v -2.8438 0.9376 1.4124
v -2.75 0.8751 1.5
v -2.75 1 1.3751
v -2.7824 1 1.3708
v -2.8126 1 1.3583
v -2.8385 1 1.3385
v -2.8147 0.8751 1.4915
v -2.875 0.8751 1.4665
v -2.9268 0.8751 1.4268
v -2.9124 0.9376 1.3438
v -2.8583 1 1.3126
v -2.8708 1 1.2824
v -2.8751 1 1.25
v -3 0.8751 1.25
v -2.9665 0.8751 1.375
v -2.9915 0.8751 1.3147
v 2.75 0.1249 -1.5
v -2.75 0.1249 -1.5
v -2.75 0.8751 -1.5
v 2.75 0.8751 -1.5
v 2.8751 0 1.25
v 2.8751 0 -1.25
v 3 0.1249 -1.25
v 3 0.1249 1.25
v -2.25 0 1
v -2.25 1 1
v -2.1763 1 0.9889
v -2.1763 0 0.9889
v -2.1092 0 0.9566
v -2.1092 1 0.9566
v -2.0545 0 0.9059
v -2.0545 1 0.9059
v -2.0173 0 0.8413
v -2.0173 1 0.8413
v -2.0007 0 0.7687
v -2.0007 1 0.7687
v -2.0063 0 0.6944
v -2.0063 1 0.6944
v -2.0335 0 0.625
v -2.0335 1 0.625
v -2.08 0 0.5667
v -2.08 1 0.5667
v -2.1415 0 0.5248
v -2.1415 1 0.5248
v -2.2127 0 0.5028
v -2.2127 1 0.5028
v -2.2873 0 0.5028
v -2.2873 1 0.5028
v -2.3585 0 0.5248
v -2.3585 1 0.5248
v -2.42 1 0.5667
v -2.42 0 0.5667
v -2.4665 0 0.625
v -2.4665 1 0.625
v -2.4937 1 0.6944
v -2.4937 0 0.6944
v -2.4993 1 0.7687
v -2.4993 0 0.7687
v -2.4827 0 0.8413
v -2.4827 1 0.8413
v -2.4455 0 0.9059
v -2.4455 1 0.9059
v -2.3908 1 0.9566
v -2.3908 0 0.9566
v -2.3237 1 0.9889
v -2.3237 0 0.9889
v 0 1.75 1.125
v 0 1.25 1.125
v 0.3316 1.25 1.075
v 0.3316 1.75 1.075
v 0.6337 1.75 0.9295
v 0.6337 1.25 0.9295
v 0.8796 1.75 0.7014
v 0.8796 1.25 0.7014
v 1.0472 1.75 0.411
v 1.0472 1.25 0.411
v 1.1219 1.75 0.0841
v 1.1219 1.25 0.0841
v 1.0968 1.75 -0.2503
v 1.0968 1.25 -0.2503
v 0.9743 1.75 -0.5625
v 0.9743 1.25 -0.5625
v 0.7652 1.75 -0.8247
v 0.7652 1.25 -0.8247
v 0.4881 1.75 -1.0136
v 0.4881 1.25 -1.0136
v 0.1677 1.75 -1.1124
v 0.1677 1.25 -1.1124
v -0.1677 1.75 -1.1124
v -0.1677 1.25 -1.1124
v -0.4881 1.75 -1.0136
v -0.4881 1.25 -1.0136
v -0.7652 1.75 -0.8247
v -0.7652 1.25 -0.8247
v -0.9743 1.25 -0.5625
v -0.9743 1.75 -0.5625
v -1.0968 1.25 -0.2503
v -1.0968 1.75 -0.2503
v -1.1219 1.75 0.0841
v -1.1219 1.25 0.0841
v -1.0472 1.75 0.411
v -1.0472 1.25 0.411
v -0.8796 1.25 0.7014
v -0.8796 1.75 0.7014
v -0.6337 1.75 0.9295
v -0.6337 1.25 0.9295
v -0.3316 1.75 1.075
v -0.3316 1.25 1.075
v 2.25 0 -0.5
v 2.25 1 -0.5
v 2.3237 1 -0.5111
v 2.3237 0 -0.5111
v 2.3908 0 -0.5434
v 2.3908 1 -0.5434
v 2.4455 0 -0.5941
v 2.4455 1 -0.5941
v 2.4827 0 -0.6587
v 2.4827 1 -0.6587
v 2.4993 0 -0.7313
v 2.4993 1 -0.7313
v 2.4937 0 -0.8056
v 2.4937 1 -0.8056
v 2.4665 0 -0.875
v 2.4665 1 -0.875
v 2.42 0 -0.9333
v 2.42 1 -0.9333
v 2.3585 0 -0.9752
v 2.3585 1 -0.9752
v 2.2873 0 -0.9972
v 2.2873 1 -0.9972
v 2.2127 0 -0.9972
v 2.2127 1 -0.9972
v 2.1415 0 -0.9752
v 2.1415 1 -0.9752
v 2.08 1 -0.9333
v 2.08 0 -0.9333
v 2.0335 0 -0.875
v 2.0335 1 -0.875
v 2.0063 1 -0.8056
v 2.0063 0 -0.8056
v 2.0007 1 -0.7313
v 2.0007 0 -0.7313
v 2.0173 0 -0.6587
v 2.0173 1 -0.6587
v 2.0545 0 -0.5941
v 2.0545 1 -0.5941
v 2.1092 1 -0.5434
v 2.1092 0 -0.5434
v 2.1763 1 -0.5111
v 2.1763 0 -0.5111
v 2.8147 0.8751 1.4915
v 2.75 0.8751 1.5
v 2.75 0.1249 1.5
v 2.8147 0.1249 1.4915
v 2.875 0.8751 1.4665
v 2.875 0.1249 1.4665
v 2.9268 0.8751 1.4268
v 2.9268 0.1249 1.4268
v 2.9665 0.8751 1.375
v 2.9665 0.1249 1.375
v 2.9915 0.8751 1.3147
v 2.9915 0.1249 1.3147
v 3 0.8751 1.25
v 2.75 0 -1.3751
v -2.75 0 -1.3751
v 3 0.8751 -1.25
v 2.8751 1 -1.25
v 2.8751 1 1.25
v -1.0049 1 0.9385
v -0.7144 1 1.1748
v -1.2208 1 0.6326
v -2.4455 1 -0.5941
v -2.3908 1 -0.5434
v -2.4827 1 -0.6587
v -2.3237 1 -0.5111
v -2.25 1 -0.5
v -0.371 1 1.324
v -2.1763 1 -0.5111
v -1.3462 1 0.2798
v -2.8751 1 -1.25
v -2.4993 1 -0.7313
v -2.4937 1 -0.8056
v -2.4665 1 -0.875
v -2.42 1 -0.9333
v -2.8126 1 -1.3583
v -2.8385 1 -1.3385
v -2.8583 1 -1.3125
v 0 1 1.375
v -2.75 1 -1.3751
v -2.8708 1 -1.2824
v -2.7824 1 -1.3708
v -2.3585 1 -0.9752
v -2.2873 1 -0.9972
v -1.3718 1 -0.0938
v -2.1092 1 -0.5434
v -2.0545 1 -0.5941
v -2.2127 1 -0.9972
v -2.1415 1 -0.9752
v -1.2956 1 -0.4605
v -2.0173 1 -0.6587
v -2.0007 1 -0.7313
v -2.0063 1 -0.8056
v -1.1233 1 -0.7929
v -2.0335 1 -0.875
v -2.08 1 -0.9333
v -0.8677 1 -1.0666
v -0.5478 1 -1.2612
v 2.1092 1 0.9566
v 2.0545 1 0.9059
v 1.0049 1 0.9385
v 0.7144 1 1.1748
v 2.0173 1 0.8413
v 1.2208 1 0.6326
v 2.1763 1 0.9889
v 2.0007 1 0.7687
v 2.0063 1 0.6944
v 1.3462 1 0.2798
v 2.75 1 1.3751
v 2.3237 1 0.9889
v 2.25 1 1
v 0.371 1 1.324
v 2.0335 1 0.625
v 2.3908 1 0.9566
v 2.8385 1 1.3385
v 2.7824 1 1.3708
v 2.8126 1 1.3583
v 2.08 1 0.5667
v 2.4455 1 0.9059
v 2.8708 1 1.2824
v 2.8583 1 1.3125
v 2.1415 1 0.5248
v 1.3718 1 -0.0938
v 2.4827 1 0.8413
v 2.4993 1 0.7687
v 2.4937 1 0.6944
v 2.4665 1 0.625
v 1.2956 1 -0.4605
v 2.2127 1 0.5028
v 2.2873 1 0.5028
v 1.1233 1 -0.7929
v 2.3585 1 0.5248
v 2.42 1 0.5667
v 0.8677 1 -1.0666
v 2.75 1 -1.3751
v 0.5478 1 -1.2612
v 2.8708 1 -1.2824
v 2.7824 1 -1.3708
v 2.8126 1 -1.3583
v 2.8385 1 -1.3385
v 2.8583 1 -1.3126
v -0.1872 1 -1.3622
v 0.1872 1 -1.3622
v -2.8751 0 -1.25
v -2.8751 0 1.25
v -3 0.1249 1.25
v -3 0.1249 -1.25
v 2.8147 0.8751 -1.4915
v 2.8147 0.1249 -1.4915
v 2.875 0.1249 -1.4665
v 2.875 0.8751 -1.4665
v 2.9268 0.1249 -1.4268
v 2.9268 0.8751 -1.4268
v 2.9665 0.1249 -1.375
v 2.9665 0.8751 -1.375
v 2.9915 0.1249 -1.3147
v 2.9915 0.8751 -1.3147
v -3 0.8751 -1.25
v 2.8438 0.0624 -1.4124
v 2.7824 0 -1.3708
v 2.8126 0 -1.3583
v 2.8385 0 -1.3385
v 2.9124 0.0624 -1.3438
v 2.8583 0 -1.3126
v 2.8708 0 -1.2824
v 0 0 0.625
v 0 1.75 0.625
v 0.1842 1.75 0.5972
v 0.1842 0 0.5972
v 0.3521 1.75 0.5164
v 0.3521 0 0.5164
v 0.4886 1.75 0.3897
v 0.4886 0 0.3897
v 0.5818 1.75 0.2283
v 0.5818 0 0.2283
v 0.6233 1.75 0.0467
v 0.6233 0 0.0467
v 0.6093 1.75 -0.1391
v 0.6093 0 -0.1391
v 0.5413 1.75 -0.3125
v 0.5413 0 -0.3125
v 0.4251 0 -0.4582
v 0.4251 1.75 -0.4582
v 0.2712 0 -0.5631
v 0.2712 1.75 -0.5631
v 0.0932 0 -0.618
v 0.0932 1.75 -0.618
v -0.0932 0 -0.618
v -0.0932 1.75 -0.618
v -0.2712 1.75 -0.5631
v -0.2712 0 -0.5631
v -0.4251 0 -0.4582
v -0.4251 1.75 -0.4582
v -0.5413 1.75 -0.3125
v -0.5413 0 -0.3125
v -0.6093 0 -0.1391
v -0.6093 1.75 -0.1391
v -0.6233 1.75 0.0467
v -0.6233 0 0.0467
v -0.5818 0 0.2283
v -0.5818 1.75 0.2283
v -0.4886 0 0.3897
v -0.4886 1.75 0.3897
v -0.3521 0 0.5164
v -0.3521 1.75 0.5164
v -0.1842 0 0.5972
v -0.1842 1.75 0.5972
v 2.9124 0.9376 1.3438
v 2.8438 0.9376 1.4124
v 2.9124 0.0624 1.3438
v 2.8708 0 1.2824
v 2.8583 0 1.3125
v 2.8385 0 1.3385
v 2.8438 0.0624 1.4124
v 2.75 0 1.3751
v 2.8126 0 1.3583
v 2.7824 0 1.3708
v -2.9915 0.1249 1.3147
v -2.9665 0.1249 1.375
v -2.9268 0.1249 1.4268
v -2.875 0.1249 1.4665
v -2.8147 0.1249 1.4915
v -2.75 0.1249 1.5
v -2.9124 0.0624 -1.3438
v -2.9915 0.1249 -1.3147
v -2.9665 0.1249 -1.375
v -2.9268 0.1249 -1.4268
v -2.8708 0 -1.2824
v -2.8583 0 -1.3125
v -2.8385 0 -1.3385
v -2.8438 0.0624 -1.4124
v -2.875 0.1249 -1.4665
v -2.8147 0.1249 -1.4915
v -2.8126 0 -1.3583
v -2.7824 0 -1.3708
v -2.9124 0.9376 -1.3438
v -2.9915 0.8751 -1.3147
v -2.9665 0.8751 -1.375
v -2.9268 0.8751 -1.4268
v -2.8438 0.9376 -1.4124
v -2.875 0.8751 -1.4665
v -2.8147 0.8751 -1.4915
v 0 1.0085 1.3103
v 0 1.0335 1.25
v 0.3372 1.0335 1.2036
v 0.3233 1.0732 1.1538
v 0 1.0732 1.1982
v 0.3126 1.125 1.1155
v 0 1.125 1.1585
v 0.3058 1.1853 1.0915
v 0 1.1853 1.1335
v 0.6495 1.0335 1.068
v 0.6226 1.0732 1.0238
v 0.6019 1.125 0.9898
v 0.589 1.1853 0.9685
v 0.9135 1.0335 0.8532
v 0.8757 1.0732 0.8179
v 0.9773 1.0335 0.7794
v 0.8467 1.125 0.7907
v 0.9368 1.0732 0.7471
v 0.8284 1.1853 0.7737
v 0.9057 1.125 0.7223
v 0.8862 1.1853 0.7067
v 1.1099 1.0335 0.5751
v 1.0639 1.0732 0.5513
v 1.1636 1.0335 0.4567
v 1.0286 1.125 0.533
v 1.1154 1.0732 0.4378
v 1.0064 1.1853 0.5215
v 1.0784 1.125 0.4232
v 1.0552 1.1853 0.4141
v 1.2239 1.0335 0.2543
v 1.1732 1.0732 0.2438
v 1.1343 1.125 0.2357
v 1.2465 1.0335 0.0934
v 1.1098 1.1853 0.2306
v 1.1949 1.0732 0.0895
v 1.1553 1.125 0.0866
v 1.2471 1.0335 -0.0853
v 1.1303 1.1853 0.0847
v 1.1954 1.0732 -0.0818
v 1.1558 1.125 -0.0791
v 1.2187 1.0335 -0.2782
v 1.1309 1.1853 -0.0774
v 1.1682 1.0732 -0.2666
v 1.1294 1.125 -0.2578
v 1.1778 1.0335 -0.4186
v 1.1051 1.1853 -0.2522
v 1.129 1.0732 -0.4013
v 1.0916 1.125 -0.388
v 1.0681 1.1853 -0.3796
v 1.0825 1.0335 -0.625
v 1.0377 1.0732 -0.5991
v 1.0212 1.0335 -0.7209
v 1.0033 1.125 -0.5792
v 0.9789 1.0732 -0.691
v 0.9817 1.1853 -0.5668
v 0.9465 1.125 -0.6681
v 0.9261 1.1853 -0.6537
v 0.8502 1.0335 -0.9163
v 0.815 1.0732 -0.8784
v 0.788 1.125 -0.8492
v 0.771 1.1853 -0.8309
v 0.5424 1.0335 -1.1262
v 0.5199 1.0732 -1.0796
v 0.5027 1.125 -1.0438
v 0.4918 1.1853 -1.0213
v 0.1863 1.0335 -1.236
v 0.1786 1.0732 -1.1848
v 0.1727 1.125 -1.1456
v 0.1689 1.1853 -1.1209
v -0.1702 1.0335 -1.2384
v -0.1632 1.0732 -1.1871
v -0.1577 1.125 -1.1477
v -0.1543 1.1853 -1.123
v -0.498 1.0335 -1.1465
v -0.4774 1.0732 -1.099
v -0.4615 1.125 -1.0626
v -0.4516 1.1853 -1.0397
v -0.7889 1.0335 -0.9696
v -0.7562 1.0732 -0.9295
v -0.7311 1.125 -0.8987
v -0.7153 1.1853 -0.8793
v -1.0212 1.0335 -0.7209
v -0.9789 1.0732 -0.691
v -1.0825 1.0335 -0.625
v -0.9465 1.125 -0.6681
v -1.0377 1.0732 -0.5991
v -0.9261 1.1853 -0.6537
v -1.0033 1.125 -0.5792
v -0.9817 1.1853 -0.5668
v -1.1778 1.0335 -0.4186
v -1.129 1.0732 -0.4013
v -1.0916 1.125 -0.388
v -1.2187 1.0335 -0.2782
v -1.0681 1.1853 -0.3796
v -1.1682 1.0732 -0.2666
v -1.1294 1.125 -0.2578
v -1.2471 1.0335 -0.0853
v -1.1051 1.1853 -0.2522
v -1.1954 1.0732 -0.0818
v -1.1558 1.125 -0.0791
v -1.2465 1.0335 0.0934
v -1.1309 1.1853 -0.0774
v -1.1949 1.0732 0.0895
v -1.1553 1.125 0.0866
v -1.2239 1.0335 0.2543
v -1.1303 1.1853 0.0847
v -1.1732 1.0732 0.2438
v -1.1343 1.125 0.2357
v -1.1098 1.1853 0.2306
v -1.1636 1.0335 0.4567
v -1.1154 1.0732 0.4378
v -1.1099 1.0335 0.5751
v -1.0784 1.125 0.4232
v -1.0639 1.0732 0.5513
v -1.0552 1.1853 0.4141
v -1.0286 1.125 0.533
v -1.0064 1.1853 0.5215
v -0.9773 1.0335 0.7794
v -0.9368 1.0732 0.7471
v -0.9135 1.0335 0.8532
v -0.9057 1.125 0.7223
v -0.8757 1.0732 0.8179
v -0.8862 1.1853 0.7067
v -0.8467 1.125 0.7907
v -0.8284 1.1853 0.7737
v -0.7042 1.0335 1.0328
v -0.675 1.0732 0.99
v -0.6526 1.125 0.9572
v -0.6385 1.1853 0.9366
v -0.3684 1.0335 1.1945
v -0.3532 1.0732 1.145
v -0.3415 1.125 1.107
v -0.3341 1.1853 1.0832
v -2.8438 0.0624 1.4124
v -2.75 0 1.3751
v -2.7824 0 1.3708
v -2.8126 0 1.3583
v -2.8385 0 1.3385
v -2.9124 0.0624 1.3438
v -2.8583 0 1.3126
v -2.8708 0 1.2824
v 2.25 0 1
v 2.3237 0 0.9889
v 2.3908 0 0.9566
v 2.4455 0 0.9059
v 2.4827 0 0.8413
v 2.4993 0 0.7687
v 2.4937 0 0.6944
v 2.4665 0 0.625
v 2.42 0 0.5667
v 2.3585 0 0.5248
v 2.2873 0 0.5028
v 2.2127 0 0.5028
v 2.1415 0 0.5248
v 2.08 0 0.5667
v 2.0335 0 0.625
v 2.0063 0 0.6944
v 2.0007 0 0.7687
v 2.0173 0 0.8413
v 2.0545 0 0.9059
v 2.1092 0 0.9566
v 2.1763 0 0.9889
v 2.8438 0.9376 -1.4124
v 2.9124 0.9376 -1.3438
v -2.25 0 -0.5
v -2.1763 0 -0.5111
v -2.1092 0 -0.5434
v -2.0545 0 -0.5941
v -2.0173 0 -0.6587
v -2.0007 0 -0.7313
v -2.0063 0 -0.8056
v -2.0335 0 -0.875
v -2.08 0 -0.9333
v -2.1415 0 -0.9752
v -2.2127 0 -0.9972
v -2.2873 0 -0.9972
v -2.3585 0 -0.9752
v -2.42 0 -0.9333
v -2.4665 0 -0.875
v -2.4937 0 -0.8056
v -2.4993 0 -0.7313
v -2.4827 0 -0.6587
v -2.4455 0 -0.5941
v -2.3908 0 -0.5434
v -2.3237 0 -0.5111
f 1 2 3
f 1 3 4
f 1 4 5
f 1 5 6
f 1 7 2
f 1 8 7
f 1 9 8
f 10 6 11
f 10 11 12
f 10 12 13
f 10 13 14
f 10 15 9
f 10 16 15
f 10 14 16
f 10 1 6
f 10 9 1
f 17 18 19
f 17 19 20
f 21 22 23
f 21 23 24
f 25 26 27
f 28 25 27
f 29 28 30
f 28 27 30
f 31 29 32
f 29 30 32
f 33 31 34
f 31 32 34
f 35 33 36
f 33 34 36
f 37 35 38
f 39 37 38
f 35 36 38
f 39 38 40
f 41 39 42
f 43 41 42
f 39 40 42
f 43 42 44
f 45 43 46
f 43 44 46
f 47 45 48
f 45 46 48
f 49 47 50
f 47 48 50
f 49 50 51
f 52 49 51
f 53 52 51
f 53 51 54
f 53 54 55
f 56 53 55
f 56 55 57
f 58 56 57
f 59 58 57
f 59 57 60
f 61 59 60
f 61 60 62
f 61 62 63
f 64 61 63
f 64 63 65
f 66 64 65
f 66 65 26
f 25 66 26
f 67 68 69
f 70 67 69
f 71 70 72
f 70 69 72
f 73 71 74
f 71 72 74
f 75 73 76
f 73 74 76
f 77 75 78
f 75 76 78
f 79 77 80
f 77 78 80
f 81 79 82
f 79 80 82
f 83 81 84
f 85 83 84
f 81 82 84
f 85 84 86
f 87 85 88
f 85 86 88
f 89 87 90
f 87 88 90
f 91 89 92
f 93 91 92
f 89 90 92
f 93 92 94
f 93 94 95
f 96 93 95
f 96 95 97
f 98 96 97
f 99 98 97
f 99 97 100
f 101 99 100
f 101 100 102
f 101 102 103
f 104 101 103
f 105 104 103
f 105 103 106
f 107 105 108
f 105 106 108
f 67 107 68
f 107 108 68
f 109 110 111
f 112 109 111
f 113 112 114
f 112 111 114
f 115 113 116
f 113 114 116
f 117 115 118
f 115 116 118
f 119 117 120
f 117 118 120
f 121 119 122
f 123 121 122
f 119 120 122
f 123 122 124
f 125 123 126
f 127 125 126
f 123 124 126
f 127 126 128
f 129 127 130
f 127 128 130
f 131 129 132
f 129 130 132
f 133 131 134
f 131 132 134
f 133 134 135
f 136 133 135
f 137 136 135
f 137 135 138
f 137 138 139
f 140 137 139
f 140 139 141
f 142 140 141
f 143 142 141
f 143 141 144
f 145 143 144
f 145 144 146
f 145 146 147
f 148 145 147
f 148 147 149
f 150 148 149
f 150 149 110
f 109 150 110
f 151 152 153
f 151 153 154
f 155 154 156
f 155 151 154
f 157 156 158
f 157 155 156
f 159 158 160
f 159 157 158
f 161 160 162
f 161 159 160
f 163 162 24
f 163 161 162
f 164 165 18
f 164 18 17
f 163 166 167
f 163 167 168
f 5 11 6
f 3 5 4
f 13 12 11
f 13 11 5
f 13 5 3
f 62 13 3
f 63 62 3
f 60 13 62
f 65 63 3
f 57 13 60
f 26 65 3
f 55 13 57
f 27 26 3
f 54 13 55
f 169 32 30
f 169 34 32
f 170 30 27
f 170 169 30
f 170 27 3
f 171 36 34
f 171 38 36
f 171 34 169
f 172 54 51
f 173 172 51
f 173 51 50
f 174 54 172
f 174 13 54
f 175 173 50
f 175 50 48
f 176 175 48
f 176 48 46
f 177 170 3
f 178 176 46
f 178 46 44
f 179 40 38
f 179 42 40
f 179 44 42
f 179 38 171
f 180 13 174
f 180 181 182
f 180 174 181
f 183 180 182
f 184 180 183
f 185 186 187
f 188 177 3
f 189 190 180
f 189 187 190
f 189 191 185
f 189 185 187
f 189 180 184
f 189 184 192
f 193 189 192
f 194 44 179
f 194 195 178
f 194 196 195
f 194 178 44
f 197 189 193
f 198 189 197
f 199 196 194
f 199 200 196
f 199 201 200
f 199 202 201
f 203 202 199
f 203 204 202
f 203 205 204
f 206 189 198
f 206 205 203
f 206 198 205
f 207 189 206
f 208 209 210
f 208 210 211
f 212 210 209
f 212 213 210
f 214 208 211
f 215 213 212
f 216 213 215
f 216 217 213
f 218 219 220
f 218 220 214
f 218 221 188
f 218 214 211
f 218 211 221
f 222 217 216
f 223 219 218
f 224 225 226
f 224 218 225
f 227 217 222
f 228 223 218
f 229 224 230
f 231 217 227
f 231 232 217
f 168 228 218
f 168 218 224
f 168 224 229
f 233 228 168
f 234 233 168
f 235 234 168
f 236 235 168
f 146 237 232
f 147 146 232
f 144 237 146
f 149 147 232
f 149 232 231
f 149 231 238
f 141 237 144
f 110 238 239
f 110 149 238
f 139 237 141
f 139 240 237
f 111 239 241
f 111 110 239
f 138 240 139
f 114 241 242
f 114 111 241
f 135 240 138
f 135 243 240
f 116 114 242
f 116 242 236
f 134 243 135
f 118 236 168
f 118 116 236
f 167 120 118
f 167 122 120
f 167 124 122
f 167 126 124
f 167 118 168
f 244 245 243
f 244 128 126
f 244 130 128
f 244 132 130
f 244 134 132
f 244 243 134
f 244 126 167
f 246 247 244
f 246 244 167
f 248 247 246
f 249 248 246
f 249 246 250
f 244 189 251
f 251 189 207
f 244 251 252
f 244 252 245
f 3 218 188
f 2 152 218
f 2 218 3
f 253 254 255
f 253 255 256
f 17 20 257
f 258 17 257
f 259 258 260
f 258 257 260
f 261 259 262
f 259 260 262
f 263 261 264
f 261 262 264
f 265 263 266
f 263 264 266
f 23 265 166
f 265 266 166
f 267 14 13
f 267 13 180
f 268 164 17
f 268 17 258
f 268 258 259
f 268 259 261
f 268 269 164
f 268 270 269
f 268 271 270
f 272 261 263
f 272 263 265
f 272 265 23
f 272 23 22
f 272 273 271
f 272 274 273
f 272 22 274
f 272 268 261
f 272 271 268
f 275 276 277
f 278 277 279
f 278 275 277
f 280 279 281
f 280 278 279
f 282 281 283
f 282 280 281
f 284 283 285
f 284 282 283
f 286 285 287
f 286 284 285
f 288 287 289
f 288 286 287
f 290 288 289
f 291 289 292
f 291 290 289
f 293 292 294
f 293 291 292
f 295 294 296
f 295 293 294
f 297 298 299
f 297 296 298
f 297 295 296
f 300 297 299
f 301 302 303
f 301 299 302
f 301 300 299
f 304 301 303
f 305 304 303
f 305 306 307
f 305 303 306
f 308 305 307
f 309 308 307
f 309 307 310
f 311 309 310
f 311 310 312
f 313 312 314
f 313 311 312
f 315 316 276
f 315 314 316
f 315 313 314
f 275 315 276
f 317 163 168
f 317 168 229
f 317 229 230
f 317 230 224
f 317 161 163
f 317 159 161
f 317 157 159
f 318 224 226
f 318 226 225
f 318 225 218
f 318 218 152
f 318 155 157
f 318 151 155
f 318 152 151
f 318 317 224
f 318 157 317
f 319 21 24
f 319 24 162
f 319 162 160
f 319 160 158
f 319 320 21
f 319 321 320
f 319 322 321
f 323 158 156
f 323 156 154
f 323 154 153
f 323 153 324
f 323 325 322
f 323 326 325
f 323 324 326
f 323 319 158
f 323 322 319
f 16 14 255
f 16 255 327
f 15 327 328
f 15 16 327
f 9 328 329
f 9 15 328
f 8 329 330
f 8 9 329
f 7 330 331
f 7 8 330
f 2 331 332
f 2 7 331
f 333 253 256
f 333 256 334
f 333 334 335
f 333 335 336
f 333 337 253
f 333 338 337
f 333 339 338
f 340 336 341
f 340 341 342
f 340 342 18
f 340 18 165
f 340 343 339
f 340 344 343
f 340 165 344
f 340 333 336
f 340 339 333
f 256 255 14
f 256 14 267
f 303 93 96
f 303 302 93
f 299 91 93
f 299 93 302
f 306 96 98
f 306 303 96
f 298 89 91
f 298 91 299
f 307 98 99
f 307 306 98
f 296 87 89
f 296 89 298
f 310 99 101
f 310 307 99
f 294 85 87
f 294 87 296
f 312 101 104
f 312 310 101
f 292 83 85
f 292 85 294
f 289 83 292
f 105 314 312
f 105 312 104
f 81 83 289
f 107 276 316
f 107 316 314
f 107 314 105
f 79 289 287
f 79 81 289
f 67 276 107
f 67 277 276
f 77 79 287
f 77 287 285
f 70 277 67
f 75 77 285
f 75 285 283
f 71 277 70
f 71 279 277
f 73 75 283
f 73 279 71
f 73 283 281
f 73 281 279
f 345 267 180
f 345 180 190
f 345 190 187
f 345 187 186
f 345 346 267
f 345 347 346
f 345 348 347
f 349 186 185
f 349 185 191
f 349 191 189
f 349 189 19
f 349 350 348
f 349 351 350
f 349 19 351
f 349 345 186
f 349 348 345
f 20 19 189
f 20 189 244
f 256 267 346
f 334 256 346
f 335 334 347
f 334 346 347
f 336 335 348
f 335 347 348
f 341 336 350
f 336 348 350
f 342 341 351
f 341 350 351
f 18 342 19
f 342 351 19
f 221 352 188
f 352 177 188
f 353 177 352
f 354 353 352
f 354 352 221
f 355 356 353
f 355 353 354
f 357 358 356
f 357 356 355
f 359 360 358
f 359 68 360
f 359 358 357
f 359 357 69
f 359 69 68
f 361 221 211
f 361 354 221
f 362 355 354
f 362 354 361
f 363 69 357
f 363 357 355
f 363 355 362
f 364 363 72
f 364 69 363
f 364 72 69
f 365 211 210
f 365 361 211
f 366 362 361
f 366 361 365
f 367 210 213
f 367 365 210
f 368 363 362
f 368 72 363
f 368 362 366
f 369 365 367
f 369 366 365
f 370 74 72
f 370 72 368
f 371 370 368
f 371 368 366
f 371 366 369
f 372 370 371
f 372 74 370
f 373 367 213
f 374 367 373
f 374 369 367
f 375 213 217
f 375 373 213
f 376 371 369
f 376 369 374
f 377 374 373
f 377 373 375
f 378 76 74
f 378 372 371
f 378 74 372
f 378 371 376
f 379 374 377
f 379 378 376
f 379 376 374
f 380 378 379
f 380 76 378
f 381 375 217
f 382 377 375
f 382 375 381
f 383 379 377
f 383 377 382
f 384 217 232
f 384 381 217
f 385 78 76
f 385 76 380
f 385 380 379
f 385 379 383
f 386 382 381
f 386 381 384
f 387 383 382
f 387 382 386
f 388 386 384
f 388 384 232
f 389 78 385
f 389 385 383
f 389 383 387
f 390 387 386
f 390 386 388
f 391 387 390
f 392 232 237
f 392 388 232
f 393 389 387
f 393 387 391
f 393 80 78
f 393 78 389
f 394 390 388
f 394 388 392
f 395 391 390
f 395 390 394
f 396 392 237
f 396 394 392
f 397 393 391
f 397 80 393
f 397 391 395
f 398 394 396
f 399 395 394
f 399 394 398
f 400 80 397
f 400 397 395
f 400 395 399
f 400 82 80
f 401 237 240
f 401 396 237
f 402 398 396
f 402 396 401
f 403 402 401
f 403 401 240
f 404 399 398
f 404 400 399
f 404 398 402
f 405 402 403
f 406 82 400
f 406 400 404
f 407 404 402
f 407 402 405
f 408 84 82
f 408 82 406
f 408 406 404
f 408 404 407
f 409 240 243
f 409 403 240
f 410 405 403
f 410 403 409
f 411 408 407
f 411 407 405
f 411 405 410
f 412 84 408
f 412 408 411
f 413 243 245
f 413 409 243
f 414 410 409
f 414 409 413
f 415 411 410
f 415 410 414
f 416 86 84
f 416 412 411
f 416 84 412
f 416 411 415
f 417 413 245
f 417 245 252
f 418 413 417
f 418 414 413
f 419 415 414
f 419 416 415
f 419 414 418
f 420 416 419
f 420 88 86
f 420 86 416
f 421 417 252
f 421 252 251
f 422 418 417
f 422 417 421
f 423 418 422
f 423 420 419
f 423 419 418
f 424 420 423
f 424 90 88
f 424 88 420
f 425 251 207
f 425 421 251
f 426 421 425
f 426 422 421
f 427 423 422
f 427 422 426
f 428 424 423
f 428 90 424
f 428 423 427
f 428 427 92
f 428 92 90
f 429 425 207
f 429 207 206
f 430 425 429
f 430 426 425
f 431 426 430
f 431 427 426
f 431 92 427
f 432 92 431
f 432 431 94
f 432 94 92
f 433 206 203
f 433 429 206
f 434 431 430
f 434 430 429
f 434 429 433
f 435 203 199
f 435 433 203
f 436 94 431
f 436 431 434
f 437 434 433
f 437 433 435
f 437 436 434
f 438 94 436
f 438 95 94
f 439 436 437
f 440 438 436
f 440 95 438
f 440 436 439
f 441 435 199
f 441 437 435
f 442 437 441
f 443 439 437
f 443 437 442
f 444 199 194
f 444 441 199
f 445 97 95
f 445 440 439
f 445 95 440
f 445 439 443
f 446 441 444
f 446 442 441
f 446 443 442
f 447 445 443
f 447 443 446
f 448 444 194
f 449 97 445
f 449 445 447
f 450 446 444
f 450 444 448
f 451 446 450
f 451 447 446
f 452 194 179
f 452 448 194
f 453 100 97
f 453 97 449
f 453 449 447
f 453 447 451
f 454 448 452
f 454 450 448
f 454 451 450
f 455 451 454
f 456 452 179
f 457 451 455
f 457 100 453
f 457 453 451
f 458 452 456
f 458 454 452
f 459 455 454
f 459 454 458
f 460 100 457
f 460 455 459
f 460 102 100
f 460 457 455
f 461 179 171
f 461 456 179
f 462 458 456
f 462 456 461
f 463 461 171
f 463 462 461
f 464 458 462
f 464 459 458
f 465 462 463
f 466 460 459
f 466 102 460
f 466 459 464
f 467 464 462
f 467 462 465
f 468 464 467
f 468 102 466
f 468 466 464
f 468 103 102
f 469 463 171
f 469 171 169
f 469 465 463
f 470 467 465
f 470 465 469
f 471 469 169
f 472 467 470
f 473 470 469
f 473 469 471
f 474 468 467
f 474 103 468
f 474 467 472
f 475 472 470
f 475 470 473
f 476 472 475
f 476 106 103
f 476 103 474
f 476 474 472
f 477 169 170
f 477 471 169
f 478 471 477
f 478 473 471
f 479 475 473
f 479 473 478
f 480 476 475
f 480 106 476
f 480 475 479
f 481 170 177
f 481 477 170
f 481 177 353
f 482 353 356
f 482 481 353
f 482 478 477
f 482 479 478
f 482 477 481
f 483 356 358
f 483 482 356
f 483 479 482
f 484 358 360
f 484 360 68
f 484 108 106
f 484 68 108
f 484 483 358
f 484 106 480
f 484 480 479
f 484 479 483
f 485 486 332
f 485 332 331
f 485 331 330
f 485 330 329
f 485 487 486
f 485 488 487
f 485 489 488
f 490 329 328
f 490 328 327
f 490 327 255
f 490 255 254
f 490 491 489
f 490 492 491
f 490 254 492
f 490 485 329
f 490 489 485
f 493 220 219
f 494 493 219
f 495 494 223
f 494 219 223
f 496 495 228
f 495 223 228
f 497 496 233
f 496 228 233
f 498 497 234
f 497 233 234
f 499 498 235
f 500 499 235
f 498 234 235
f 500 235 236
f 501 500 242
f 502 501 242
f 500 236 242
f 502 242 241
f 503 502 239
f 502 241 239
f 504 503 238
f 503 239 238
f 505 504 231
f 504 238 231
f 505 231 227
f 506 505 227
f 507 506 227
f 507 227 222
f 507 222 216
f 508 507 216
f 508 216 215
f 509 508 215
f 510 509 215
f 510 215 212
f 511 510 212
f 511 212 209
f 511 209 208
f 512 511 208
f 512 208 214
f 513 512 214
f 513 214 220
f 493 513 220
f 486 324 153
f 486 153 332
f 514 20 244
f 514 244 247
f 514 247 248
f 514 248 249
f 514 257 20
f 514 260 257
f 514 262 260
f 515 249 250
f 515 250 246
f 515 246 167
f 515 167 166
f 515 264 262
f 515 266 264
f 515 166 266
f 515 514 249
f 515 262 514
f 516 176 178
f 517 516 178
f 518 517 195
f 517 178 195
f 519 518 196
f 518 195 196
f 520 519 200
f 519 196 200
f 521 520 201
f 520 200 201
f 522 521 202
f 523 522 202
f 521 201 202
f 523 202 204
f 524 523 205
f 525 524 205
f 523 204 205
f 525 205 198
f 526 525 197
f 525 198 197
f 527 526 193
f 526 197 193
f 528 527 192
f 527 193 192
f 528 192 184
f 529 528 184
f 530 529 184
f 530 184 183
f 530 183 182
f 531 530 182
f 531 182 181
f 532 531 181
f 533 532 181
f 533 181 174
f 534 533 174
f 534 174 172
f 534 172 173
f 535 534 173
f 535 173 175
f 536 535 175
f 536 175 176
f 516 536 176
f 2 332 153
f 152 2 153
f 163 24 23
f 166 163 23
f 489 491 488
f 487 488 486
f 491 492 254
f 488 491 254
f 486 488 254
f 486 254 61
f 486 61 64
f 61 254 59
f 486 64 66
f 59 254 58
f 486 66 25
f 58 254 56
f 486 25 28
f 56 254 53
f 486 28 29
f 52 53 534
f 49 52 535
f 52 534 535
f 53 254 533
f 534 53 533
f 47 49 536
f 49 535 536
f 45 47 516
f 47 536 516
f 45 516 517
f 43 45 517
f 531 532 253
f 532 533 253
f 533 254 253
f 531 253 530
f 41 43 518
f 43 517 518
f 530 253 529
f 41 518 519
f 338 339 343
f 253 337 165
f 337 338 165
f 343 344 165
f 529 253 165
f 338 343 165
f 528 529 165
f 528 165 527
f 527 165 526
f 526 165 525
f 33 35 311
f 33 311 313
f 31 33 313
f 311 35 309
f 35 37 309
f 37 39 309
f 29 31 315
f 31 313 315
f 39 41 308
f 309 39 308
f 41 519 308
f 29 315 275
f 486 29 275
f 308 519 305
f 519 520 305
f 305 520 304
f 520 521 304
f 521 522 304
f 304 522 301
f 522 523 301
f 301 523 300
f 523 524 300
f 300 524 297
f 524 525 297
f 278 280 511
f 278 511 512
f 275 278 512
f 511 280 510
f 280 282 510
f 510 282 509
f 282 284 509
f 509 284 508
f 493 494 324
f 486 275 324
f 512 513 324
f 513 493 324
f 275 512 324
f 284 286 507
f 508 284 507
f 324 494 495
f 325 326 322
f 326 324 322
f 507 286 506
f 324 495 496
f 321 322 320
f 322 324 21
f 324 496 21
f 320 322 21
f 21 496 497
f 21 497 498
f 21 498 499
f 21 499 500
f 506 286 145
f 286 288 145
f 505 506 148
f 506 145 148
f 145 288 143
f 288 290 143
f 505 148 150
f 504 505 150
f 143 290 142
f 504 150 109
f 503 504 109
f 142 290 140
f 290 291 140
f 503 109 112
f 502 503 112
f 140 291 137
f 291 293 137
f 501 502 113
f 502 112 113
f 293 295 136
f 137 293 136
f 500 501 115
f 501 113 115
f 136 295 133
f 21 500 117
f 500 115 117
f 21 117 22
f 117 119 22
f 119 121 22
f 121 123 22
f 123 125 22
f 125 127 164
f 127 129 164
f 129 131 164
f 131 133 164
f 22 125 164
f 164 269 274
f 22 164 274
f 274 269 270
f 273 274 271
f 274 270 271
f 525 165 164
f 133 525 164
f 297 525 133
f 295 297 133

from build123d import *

# Parameters (mm, degrees)
SKETCH1_W           = 6
SKETCH1_H           = 3
BOSS_EXTRUDE1_DEPTH = 1
SKETCH3_R           = 1.125
BOSS_EXTRUDE3_DEPTH = 0.75
SKETCH5_R           = 0.625
CUT_EXTRUDE3_DEPTH  = 4.783186488
FILLET1_R           = 0.25
SKETCH6_R           = 0.25
CUT_EXTRUDE4_DEPTH  = 4.5
FILLET3_R           = 0.25
CHAMFER2_SIZE       = 0.125


with BuildPart() as part:
    # Sketch1 → Boss-Extrude1 (new body)
    with BuildSketch(Plane(origin=(0, 0, 0), x_dir=(1, 0, 0), z_dir=(0, 1, 0))):
        Rectangle(SKETCH1_W, SKETCH1_H)
    extrude(amount=BOSS_EXTRUDE1_DEPTH)

    # Sketch3 → Boss-Extrude3 (add)
    with BuildSketch(Plane(origin=(0, 1, 0), x_dir=(1, 0, 0), z_dir=(0, 1, 0))):
        with Locations(Location((0, 0, 0), (0, 0, 270))):
            Circle(SKETCH3_R)
    extrude(amount=BOSS_EXTRUDE3_DEPTH)

    # Sketch5 → Cut-Extrude3 (cut, through all)
    with BuildSketch(Plane(origin=(0, 0, 0), x_dir=(1, 0, 0), z_dir=(0, 1, 0))):
        with Locations(Location((0, 0, 0), (0, 0, 270))):
            Circle(SKETCH5_R)
    extrude(amount=CUT_EXTRUDE3_DEPTH, mode=Mode.SUBTRACT)

    # Fillet1
    fillet1_edges = [part.edges().sort_by_distance(p)[0] for p in [
        (0, 1, -1.125),
    ]]
    fillet(fillet1_edges, radius=FILLET1_R)

    # Sketch6 → Cut-Extrude4 (cut, through all)
    with BuildSketch(Plane(origin=(0, 1, 0), x_dir=(1, 0, 0), z_dir=(0, 1, 0))):
        with Locations(Location((2.25, -0.75, 0), (0, 0, 270))):
            Circle(SKETCH6_R)
        with Locations(Location((2.25, 0.75, 0), (0, 0, 270))):
            Circle(SKETCH6_R)
        with Locations(Location((-2.25, 0.75, 0), (0, 0, 270))):
            Circle(SKETCH6_R)
        with Locations(Location((-2.25, -0.75, 0), (0, 0, 270))):
            Circle(SKETCH6_R)
    extrude(amount=-CUT_EXTRUDE4_DEPTH, mode=Mode.SUBTRACT)

    # Fillet3
    fillet3_edges = [part.edges().sort_by_distance(p)[0] for p in [
        (3, 0.5, 1.5),
        (-3, 0.5, 1.5),
        (-3, 0.5, -1.5),
        (3, 0.5, -1.5),
    ]]
    fillet(fillet3_edges, radius=FILLET3_R)

    # Chamfer2
    chamfer2_edges = [part.edges().sort_by_distance(p)[0] for p in [
        (0, 0, -1.5),
        (0, 1, -1.5),
        (3, 0, 0),
        (0, 0, 1.5),
        (-3, 0, 0),
        (-2.926776695, 0, -1.426776695),
        (-2.926776695, 0, 1.426776695),
        (2.926776695, 0, 1.426776695),
        (2.926776695, 0, -1.426776695),
        (3, 1, 0),
        (-3, 1, 0),
        (0, 1, 1.5),
        (-2.926776695, 1, -1.426776695),
        (-2.926776695, 1, 1.426776695),
        (2.926776695, 1, 1.426776695),
        (2.926776695, 1, -1.426776695),
    ]]
    chamfer(chamfer2_edges, length=CHAMFER2_SIZE - 0.0001)  # a hair under: the kernel refuses the full size


solid = part.part
